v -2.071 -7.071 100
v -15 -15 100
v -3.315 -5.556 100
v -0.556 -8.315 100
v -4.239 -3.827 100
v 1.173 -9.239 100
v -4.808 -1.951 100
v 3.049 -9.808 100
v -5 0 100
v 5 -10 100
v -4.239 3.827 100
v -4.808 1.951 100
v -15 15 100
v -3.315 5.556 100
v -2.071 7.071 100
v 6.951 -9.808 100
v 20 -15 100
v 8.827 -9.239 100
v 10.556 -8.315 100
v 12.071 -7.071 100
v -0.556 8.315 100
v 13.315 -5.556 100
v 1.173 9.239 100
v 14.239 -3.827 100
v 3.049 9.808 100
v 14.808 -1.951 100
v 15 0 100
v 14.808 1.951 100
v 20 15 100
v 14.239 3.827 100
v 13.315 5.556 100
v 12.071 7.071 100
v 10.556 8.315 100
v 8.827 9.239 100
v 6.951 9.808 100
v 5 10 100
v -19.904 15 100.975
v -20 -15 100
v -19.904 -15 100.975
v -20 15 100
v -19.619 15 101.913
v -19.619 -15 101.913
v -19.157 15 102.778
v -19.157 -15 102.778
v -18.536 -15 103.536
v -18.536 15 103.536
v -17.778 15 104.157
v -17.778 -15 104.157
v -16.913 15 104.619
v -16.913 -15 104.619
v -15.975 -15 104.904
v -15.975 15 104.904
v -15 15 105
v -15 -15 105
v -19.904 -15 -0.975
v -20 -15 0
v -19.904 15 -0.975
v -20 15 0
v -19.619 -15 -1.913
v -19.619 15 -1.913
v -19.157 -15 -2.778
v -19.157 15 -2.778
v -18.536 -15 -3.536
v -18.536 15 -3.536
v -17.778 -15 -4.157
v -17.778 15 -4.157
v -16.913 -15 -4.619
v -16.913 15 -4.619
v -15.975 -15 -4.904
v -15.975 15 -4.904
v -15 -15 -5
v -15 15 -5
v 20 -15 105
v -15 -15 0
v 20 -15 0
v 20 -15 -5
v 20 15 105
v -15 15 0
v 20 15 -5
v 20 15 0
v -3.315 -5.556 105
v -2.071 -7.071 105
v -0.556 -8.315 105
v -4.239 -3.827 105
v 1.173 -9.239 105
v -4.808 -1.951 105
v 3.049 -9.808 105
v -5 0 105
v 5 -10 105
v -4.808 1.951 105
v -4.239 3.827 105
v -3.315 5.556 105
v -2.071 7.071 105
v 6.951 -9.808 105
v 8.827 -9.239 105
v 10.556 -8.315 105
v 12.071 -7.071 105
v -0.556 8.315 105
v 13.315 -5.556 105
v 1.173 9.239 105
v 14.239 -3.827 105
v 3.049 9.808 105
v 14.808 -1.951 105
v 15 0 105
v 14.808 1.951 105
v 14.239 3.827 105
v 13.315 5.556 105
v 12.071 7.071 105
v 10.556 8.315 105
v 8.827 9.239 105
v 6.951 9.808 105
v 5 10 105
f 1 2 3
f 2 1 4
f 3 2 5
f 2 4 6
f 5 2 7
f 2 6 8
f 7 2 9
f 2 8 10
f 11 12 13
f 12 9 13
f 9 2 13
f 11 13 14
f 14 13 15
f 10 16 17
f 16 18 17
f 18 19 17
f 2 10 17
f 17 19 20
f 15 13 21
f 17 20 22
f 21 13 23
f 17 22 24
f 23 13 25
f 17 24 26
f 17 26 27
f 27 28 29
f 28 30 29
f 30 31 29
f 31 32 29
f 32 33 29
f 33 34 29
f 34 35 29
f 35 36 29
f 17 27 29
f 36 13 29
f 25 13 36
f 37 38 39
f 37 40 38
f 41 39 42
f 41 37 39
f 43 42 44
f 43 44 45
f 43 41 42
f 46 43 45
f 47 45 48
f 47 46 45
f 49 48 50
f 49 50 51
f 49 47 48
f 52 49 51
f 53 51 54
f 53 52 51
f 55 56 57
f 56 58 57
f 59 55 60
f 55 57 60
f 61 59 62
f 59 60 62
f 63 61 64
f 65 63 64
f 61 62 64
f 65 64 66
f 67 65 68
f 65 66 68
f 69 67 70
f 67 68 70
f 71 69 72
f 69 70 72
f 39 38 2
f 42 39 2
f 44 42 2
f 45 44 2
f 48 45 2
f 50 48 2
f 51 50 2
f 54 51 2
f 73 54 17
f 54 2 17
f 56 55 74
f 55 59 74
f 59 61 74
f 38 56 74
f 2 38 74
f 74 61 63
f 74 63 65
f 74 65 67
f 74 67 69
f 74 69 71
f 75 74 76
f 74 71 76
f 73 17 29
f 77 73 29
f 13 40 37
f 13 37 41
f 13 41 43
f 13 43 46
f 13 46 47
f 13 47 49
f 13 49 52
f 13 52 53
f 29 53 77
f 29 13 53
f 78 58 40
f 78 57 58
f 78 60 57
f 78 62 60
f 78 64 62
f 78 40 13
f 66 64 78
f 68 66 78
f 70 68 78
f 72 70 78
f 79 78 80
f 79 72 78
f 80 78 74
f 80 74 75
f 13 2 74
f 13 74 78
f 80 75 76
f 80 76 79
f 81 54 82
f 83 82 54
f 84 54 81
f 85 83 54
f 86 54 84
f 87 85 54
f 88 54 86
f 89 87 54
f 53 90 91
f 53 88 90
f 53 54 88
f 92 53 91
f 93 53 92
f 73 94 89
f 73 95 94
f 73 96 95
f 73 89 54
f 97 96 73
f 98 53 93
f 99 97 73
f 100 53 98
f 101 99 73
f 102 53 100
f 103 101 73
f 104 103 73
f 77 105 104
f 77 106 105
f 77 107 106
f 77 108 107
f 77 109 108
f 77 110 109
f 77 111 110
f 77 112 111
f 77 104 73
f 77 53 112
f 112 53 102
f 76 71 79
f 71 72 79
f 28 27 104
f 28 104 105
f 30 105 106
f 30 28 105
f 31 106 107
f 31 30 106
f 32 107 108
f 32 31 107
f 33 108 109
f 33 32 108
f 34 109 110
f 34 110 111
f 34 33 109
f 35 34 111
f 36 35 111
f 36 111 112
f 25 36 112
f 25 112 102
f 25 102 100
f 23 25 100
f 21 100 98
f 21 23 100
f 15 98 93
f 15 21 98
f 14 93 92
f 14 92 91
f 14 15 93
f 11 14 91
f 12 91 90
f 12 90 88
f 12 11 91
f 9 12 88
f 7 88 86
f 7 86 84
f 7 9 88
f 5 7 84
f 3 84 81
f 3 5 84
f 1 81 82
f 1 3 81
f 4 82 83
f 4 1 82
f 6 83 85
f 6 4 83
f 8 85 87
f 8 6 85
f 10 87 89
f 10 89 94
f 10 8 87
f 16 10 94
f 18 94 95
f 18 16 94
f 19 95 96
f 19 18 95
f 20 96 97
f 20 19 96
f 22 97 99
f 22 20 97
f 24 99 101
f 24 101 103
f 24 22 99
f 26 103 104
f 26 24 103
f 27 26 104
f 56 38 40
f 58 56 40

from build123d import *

# Parameters (mm, degrees)
F0_W     = 5
F0_H     = 30
F0_W_2   = 35
F1_DEPTH = 5
F2_DEPTH = 100
F3_W     = 40
F3_H     = 30
F3_R     = 10
F4_DEPTH = 5
F5_R     = 5


with BuildPart() as f1:
    # F0 (on Top) → F1 (new body)
    with BuildSketch(Plane.XY):
        with Locations((-17.5, 0)):
            Rectangle(F0_W, F0_H)
        with Locations((2.5, 0)):
            Rectangle(F0_W_2, F0_H)
    extrude(amount=-F1_DEPTH)

    # F0 (on Top) → F2 (join)
    with BuildSketch(Plane.XY):
        with Locations((-17.5, 0)):
            Rectangle(F0_W, F0_H)
    extrude(amount=F2_DEPTH)

    # F3 (on face) → F4 (join)
    with BuildSketch(Plane.XY.offset(100)):
        Rectangle(F3_W, F3_H)
        with Locations((5, 0)):
            Circle(F3_R, mode=Mode.SUBTRACT)
    extrude(amount=F4_DEPTH)

    # F5
    f5_edges = [f1.edges().sort_by_distance(p)[0] for p in [
        (-20, 0, -5),
        (-20, 0, 105),
    ]]
    fillet(f5_edges, radius=F5_R)


solid = f1.part
